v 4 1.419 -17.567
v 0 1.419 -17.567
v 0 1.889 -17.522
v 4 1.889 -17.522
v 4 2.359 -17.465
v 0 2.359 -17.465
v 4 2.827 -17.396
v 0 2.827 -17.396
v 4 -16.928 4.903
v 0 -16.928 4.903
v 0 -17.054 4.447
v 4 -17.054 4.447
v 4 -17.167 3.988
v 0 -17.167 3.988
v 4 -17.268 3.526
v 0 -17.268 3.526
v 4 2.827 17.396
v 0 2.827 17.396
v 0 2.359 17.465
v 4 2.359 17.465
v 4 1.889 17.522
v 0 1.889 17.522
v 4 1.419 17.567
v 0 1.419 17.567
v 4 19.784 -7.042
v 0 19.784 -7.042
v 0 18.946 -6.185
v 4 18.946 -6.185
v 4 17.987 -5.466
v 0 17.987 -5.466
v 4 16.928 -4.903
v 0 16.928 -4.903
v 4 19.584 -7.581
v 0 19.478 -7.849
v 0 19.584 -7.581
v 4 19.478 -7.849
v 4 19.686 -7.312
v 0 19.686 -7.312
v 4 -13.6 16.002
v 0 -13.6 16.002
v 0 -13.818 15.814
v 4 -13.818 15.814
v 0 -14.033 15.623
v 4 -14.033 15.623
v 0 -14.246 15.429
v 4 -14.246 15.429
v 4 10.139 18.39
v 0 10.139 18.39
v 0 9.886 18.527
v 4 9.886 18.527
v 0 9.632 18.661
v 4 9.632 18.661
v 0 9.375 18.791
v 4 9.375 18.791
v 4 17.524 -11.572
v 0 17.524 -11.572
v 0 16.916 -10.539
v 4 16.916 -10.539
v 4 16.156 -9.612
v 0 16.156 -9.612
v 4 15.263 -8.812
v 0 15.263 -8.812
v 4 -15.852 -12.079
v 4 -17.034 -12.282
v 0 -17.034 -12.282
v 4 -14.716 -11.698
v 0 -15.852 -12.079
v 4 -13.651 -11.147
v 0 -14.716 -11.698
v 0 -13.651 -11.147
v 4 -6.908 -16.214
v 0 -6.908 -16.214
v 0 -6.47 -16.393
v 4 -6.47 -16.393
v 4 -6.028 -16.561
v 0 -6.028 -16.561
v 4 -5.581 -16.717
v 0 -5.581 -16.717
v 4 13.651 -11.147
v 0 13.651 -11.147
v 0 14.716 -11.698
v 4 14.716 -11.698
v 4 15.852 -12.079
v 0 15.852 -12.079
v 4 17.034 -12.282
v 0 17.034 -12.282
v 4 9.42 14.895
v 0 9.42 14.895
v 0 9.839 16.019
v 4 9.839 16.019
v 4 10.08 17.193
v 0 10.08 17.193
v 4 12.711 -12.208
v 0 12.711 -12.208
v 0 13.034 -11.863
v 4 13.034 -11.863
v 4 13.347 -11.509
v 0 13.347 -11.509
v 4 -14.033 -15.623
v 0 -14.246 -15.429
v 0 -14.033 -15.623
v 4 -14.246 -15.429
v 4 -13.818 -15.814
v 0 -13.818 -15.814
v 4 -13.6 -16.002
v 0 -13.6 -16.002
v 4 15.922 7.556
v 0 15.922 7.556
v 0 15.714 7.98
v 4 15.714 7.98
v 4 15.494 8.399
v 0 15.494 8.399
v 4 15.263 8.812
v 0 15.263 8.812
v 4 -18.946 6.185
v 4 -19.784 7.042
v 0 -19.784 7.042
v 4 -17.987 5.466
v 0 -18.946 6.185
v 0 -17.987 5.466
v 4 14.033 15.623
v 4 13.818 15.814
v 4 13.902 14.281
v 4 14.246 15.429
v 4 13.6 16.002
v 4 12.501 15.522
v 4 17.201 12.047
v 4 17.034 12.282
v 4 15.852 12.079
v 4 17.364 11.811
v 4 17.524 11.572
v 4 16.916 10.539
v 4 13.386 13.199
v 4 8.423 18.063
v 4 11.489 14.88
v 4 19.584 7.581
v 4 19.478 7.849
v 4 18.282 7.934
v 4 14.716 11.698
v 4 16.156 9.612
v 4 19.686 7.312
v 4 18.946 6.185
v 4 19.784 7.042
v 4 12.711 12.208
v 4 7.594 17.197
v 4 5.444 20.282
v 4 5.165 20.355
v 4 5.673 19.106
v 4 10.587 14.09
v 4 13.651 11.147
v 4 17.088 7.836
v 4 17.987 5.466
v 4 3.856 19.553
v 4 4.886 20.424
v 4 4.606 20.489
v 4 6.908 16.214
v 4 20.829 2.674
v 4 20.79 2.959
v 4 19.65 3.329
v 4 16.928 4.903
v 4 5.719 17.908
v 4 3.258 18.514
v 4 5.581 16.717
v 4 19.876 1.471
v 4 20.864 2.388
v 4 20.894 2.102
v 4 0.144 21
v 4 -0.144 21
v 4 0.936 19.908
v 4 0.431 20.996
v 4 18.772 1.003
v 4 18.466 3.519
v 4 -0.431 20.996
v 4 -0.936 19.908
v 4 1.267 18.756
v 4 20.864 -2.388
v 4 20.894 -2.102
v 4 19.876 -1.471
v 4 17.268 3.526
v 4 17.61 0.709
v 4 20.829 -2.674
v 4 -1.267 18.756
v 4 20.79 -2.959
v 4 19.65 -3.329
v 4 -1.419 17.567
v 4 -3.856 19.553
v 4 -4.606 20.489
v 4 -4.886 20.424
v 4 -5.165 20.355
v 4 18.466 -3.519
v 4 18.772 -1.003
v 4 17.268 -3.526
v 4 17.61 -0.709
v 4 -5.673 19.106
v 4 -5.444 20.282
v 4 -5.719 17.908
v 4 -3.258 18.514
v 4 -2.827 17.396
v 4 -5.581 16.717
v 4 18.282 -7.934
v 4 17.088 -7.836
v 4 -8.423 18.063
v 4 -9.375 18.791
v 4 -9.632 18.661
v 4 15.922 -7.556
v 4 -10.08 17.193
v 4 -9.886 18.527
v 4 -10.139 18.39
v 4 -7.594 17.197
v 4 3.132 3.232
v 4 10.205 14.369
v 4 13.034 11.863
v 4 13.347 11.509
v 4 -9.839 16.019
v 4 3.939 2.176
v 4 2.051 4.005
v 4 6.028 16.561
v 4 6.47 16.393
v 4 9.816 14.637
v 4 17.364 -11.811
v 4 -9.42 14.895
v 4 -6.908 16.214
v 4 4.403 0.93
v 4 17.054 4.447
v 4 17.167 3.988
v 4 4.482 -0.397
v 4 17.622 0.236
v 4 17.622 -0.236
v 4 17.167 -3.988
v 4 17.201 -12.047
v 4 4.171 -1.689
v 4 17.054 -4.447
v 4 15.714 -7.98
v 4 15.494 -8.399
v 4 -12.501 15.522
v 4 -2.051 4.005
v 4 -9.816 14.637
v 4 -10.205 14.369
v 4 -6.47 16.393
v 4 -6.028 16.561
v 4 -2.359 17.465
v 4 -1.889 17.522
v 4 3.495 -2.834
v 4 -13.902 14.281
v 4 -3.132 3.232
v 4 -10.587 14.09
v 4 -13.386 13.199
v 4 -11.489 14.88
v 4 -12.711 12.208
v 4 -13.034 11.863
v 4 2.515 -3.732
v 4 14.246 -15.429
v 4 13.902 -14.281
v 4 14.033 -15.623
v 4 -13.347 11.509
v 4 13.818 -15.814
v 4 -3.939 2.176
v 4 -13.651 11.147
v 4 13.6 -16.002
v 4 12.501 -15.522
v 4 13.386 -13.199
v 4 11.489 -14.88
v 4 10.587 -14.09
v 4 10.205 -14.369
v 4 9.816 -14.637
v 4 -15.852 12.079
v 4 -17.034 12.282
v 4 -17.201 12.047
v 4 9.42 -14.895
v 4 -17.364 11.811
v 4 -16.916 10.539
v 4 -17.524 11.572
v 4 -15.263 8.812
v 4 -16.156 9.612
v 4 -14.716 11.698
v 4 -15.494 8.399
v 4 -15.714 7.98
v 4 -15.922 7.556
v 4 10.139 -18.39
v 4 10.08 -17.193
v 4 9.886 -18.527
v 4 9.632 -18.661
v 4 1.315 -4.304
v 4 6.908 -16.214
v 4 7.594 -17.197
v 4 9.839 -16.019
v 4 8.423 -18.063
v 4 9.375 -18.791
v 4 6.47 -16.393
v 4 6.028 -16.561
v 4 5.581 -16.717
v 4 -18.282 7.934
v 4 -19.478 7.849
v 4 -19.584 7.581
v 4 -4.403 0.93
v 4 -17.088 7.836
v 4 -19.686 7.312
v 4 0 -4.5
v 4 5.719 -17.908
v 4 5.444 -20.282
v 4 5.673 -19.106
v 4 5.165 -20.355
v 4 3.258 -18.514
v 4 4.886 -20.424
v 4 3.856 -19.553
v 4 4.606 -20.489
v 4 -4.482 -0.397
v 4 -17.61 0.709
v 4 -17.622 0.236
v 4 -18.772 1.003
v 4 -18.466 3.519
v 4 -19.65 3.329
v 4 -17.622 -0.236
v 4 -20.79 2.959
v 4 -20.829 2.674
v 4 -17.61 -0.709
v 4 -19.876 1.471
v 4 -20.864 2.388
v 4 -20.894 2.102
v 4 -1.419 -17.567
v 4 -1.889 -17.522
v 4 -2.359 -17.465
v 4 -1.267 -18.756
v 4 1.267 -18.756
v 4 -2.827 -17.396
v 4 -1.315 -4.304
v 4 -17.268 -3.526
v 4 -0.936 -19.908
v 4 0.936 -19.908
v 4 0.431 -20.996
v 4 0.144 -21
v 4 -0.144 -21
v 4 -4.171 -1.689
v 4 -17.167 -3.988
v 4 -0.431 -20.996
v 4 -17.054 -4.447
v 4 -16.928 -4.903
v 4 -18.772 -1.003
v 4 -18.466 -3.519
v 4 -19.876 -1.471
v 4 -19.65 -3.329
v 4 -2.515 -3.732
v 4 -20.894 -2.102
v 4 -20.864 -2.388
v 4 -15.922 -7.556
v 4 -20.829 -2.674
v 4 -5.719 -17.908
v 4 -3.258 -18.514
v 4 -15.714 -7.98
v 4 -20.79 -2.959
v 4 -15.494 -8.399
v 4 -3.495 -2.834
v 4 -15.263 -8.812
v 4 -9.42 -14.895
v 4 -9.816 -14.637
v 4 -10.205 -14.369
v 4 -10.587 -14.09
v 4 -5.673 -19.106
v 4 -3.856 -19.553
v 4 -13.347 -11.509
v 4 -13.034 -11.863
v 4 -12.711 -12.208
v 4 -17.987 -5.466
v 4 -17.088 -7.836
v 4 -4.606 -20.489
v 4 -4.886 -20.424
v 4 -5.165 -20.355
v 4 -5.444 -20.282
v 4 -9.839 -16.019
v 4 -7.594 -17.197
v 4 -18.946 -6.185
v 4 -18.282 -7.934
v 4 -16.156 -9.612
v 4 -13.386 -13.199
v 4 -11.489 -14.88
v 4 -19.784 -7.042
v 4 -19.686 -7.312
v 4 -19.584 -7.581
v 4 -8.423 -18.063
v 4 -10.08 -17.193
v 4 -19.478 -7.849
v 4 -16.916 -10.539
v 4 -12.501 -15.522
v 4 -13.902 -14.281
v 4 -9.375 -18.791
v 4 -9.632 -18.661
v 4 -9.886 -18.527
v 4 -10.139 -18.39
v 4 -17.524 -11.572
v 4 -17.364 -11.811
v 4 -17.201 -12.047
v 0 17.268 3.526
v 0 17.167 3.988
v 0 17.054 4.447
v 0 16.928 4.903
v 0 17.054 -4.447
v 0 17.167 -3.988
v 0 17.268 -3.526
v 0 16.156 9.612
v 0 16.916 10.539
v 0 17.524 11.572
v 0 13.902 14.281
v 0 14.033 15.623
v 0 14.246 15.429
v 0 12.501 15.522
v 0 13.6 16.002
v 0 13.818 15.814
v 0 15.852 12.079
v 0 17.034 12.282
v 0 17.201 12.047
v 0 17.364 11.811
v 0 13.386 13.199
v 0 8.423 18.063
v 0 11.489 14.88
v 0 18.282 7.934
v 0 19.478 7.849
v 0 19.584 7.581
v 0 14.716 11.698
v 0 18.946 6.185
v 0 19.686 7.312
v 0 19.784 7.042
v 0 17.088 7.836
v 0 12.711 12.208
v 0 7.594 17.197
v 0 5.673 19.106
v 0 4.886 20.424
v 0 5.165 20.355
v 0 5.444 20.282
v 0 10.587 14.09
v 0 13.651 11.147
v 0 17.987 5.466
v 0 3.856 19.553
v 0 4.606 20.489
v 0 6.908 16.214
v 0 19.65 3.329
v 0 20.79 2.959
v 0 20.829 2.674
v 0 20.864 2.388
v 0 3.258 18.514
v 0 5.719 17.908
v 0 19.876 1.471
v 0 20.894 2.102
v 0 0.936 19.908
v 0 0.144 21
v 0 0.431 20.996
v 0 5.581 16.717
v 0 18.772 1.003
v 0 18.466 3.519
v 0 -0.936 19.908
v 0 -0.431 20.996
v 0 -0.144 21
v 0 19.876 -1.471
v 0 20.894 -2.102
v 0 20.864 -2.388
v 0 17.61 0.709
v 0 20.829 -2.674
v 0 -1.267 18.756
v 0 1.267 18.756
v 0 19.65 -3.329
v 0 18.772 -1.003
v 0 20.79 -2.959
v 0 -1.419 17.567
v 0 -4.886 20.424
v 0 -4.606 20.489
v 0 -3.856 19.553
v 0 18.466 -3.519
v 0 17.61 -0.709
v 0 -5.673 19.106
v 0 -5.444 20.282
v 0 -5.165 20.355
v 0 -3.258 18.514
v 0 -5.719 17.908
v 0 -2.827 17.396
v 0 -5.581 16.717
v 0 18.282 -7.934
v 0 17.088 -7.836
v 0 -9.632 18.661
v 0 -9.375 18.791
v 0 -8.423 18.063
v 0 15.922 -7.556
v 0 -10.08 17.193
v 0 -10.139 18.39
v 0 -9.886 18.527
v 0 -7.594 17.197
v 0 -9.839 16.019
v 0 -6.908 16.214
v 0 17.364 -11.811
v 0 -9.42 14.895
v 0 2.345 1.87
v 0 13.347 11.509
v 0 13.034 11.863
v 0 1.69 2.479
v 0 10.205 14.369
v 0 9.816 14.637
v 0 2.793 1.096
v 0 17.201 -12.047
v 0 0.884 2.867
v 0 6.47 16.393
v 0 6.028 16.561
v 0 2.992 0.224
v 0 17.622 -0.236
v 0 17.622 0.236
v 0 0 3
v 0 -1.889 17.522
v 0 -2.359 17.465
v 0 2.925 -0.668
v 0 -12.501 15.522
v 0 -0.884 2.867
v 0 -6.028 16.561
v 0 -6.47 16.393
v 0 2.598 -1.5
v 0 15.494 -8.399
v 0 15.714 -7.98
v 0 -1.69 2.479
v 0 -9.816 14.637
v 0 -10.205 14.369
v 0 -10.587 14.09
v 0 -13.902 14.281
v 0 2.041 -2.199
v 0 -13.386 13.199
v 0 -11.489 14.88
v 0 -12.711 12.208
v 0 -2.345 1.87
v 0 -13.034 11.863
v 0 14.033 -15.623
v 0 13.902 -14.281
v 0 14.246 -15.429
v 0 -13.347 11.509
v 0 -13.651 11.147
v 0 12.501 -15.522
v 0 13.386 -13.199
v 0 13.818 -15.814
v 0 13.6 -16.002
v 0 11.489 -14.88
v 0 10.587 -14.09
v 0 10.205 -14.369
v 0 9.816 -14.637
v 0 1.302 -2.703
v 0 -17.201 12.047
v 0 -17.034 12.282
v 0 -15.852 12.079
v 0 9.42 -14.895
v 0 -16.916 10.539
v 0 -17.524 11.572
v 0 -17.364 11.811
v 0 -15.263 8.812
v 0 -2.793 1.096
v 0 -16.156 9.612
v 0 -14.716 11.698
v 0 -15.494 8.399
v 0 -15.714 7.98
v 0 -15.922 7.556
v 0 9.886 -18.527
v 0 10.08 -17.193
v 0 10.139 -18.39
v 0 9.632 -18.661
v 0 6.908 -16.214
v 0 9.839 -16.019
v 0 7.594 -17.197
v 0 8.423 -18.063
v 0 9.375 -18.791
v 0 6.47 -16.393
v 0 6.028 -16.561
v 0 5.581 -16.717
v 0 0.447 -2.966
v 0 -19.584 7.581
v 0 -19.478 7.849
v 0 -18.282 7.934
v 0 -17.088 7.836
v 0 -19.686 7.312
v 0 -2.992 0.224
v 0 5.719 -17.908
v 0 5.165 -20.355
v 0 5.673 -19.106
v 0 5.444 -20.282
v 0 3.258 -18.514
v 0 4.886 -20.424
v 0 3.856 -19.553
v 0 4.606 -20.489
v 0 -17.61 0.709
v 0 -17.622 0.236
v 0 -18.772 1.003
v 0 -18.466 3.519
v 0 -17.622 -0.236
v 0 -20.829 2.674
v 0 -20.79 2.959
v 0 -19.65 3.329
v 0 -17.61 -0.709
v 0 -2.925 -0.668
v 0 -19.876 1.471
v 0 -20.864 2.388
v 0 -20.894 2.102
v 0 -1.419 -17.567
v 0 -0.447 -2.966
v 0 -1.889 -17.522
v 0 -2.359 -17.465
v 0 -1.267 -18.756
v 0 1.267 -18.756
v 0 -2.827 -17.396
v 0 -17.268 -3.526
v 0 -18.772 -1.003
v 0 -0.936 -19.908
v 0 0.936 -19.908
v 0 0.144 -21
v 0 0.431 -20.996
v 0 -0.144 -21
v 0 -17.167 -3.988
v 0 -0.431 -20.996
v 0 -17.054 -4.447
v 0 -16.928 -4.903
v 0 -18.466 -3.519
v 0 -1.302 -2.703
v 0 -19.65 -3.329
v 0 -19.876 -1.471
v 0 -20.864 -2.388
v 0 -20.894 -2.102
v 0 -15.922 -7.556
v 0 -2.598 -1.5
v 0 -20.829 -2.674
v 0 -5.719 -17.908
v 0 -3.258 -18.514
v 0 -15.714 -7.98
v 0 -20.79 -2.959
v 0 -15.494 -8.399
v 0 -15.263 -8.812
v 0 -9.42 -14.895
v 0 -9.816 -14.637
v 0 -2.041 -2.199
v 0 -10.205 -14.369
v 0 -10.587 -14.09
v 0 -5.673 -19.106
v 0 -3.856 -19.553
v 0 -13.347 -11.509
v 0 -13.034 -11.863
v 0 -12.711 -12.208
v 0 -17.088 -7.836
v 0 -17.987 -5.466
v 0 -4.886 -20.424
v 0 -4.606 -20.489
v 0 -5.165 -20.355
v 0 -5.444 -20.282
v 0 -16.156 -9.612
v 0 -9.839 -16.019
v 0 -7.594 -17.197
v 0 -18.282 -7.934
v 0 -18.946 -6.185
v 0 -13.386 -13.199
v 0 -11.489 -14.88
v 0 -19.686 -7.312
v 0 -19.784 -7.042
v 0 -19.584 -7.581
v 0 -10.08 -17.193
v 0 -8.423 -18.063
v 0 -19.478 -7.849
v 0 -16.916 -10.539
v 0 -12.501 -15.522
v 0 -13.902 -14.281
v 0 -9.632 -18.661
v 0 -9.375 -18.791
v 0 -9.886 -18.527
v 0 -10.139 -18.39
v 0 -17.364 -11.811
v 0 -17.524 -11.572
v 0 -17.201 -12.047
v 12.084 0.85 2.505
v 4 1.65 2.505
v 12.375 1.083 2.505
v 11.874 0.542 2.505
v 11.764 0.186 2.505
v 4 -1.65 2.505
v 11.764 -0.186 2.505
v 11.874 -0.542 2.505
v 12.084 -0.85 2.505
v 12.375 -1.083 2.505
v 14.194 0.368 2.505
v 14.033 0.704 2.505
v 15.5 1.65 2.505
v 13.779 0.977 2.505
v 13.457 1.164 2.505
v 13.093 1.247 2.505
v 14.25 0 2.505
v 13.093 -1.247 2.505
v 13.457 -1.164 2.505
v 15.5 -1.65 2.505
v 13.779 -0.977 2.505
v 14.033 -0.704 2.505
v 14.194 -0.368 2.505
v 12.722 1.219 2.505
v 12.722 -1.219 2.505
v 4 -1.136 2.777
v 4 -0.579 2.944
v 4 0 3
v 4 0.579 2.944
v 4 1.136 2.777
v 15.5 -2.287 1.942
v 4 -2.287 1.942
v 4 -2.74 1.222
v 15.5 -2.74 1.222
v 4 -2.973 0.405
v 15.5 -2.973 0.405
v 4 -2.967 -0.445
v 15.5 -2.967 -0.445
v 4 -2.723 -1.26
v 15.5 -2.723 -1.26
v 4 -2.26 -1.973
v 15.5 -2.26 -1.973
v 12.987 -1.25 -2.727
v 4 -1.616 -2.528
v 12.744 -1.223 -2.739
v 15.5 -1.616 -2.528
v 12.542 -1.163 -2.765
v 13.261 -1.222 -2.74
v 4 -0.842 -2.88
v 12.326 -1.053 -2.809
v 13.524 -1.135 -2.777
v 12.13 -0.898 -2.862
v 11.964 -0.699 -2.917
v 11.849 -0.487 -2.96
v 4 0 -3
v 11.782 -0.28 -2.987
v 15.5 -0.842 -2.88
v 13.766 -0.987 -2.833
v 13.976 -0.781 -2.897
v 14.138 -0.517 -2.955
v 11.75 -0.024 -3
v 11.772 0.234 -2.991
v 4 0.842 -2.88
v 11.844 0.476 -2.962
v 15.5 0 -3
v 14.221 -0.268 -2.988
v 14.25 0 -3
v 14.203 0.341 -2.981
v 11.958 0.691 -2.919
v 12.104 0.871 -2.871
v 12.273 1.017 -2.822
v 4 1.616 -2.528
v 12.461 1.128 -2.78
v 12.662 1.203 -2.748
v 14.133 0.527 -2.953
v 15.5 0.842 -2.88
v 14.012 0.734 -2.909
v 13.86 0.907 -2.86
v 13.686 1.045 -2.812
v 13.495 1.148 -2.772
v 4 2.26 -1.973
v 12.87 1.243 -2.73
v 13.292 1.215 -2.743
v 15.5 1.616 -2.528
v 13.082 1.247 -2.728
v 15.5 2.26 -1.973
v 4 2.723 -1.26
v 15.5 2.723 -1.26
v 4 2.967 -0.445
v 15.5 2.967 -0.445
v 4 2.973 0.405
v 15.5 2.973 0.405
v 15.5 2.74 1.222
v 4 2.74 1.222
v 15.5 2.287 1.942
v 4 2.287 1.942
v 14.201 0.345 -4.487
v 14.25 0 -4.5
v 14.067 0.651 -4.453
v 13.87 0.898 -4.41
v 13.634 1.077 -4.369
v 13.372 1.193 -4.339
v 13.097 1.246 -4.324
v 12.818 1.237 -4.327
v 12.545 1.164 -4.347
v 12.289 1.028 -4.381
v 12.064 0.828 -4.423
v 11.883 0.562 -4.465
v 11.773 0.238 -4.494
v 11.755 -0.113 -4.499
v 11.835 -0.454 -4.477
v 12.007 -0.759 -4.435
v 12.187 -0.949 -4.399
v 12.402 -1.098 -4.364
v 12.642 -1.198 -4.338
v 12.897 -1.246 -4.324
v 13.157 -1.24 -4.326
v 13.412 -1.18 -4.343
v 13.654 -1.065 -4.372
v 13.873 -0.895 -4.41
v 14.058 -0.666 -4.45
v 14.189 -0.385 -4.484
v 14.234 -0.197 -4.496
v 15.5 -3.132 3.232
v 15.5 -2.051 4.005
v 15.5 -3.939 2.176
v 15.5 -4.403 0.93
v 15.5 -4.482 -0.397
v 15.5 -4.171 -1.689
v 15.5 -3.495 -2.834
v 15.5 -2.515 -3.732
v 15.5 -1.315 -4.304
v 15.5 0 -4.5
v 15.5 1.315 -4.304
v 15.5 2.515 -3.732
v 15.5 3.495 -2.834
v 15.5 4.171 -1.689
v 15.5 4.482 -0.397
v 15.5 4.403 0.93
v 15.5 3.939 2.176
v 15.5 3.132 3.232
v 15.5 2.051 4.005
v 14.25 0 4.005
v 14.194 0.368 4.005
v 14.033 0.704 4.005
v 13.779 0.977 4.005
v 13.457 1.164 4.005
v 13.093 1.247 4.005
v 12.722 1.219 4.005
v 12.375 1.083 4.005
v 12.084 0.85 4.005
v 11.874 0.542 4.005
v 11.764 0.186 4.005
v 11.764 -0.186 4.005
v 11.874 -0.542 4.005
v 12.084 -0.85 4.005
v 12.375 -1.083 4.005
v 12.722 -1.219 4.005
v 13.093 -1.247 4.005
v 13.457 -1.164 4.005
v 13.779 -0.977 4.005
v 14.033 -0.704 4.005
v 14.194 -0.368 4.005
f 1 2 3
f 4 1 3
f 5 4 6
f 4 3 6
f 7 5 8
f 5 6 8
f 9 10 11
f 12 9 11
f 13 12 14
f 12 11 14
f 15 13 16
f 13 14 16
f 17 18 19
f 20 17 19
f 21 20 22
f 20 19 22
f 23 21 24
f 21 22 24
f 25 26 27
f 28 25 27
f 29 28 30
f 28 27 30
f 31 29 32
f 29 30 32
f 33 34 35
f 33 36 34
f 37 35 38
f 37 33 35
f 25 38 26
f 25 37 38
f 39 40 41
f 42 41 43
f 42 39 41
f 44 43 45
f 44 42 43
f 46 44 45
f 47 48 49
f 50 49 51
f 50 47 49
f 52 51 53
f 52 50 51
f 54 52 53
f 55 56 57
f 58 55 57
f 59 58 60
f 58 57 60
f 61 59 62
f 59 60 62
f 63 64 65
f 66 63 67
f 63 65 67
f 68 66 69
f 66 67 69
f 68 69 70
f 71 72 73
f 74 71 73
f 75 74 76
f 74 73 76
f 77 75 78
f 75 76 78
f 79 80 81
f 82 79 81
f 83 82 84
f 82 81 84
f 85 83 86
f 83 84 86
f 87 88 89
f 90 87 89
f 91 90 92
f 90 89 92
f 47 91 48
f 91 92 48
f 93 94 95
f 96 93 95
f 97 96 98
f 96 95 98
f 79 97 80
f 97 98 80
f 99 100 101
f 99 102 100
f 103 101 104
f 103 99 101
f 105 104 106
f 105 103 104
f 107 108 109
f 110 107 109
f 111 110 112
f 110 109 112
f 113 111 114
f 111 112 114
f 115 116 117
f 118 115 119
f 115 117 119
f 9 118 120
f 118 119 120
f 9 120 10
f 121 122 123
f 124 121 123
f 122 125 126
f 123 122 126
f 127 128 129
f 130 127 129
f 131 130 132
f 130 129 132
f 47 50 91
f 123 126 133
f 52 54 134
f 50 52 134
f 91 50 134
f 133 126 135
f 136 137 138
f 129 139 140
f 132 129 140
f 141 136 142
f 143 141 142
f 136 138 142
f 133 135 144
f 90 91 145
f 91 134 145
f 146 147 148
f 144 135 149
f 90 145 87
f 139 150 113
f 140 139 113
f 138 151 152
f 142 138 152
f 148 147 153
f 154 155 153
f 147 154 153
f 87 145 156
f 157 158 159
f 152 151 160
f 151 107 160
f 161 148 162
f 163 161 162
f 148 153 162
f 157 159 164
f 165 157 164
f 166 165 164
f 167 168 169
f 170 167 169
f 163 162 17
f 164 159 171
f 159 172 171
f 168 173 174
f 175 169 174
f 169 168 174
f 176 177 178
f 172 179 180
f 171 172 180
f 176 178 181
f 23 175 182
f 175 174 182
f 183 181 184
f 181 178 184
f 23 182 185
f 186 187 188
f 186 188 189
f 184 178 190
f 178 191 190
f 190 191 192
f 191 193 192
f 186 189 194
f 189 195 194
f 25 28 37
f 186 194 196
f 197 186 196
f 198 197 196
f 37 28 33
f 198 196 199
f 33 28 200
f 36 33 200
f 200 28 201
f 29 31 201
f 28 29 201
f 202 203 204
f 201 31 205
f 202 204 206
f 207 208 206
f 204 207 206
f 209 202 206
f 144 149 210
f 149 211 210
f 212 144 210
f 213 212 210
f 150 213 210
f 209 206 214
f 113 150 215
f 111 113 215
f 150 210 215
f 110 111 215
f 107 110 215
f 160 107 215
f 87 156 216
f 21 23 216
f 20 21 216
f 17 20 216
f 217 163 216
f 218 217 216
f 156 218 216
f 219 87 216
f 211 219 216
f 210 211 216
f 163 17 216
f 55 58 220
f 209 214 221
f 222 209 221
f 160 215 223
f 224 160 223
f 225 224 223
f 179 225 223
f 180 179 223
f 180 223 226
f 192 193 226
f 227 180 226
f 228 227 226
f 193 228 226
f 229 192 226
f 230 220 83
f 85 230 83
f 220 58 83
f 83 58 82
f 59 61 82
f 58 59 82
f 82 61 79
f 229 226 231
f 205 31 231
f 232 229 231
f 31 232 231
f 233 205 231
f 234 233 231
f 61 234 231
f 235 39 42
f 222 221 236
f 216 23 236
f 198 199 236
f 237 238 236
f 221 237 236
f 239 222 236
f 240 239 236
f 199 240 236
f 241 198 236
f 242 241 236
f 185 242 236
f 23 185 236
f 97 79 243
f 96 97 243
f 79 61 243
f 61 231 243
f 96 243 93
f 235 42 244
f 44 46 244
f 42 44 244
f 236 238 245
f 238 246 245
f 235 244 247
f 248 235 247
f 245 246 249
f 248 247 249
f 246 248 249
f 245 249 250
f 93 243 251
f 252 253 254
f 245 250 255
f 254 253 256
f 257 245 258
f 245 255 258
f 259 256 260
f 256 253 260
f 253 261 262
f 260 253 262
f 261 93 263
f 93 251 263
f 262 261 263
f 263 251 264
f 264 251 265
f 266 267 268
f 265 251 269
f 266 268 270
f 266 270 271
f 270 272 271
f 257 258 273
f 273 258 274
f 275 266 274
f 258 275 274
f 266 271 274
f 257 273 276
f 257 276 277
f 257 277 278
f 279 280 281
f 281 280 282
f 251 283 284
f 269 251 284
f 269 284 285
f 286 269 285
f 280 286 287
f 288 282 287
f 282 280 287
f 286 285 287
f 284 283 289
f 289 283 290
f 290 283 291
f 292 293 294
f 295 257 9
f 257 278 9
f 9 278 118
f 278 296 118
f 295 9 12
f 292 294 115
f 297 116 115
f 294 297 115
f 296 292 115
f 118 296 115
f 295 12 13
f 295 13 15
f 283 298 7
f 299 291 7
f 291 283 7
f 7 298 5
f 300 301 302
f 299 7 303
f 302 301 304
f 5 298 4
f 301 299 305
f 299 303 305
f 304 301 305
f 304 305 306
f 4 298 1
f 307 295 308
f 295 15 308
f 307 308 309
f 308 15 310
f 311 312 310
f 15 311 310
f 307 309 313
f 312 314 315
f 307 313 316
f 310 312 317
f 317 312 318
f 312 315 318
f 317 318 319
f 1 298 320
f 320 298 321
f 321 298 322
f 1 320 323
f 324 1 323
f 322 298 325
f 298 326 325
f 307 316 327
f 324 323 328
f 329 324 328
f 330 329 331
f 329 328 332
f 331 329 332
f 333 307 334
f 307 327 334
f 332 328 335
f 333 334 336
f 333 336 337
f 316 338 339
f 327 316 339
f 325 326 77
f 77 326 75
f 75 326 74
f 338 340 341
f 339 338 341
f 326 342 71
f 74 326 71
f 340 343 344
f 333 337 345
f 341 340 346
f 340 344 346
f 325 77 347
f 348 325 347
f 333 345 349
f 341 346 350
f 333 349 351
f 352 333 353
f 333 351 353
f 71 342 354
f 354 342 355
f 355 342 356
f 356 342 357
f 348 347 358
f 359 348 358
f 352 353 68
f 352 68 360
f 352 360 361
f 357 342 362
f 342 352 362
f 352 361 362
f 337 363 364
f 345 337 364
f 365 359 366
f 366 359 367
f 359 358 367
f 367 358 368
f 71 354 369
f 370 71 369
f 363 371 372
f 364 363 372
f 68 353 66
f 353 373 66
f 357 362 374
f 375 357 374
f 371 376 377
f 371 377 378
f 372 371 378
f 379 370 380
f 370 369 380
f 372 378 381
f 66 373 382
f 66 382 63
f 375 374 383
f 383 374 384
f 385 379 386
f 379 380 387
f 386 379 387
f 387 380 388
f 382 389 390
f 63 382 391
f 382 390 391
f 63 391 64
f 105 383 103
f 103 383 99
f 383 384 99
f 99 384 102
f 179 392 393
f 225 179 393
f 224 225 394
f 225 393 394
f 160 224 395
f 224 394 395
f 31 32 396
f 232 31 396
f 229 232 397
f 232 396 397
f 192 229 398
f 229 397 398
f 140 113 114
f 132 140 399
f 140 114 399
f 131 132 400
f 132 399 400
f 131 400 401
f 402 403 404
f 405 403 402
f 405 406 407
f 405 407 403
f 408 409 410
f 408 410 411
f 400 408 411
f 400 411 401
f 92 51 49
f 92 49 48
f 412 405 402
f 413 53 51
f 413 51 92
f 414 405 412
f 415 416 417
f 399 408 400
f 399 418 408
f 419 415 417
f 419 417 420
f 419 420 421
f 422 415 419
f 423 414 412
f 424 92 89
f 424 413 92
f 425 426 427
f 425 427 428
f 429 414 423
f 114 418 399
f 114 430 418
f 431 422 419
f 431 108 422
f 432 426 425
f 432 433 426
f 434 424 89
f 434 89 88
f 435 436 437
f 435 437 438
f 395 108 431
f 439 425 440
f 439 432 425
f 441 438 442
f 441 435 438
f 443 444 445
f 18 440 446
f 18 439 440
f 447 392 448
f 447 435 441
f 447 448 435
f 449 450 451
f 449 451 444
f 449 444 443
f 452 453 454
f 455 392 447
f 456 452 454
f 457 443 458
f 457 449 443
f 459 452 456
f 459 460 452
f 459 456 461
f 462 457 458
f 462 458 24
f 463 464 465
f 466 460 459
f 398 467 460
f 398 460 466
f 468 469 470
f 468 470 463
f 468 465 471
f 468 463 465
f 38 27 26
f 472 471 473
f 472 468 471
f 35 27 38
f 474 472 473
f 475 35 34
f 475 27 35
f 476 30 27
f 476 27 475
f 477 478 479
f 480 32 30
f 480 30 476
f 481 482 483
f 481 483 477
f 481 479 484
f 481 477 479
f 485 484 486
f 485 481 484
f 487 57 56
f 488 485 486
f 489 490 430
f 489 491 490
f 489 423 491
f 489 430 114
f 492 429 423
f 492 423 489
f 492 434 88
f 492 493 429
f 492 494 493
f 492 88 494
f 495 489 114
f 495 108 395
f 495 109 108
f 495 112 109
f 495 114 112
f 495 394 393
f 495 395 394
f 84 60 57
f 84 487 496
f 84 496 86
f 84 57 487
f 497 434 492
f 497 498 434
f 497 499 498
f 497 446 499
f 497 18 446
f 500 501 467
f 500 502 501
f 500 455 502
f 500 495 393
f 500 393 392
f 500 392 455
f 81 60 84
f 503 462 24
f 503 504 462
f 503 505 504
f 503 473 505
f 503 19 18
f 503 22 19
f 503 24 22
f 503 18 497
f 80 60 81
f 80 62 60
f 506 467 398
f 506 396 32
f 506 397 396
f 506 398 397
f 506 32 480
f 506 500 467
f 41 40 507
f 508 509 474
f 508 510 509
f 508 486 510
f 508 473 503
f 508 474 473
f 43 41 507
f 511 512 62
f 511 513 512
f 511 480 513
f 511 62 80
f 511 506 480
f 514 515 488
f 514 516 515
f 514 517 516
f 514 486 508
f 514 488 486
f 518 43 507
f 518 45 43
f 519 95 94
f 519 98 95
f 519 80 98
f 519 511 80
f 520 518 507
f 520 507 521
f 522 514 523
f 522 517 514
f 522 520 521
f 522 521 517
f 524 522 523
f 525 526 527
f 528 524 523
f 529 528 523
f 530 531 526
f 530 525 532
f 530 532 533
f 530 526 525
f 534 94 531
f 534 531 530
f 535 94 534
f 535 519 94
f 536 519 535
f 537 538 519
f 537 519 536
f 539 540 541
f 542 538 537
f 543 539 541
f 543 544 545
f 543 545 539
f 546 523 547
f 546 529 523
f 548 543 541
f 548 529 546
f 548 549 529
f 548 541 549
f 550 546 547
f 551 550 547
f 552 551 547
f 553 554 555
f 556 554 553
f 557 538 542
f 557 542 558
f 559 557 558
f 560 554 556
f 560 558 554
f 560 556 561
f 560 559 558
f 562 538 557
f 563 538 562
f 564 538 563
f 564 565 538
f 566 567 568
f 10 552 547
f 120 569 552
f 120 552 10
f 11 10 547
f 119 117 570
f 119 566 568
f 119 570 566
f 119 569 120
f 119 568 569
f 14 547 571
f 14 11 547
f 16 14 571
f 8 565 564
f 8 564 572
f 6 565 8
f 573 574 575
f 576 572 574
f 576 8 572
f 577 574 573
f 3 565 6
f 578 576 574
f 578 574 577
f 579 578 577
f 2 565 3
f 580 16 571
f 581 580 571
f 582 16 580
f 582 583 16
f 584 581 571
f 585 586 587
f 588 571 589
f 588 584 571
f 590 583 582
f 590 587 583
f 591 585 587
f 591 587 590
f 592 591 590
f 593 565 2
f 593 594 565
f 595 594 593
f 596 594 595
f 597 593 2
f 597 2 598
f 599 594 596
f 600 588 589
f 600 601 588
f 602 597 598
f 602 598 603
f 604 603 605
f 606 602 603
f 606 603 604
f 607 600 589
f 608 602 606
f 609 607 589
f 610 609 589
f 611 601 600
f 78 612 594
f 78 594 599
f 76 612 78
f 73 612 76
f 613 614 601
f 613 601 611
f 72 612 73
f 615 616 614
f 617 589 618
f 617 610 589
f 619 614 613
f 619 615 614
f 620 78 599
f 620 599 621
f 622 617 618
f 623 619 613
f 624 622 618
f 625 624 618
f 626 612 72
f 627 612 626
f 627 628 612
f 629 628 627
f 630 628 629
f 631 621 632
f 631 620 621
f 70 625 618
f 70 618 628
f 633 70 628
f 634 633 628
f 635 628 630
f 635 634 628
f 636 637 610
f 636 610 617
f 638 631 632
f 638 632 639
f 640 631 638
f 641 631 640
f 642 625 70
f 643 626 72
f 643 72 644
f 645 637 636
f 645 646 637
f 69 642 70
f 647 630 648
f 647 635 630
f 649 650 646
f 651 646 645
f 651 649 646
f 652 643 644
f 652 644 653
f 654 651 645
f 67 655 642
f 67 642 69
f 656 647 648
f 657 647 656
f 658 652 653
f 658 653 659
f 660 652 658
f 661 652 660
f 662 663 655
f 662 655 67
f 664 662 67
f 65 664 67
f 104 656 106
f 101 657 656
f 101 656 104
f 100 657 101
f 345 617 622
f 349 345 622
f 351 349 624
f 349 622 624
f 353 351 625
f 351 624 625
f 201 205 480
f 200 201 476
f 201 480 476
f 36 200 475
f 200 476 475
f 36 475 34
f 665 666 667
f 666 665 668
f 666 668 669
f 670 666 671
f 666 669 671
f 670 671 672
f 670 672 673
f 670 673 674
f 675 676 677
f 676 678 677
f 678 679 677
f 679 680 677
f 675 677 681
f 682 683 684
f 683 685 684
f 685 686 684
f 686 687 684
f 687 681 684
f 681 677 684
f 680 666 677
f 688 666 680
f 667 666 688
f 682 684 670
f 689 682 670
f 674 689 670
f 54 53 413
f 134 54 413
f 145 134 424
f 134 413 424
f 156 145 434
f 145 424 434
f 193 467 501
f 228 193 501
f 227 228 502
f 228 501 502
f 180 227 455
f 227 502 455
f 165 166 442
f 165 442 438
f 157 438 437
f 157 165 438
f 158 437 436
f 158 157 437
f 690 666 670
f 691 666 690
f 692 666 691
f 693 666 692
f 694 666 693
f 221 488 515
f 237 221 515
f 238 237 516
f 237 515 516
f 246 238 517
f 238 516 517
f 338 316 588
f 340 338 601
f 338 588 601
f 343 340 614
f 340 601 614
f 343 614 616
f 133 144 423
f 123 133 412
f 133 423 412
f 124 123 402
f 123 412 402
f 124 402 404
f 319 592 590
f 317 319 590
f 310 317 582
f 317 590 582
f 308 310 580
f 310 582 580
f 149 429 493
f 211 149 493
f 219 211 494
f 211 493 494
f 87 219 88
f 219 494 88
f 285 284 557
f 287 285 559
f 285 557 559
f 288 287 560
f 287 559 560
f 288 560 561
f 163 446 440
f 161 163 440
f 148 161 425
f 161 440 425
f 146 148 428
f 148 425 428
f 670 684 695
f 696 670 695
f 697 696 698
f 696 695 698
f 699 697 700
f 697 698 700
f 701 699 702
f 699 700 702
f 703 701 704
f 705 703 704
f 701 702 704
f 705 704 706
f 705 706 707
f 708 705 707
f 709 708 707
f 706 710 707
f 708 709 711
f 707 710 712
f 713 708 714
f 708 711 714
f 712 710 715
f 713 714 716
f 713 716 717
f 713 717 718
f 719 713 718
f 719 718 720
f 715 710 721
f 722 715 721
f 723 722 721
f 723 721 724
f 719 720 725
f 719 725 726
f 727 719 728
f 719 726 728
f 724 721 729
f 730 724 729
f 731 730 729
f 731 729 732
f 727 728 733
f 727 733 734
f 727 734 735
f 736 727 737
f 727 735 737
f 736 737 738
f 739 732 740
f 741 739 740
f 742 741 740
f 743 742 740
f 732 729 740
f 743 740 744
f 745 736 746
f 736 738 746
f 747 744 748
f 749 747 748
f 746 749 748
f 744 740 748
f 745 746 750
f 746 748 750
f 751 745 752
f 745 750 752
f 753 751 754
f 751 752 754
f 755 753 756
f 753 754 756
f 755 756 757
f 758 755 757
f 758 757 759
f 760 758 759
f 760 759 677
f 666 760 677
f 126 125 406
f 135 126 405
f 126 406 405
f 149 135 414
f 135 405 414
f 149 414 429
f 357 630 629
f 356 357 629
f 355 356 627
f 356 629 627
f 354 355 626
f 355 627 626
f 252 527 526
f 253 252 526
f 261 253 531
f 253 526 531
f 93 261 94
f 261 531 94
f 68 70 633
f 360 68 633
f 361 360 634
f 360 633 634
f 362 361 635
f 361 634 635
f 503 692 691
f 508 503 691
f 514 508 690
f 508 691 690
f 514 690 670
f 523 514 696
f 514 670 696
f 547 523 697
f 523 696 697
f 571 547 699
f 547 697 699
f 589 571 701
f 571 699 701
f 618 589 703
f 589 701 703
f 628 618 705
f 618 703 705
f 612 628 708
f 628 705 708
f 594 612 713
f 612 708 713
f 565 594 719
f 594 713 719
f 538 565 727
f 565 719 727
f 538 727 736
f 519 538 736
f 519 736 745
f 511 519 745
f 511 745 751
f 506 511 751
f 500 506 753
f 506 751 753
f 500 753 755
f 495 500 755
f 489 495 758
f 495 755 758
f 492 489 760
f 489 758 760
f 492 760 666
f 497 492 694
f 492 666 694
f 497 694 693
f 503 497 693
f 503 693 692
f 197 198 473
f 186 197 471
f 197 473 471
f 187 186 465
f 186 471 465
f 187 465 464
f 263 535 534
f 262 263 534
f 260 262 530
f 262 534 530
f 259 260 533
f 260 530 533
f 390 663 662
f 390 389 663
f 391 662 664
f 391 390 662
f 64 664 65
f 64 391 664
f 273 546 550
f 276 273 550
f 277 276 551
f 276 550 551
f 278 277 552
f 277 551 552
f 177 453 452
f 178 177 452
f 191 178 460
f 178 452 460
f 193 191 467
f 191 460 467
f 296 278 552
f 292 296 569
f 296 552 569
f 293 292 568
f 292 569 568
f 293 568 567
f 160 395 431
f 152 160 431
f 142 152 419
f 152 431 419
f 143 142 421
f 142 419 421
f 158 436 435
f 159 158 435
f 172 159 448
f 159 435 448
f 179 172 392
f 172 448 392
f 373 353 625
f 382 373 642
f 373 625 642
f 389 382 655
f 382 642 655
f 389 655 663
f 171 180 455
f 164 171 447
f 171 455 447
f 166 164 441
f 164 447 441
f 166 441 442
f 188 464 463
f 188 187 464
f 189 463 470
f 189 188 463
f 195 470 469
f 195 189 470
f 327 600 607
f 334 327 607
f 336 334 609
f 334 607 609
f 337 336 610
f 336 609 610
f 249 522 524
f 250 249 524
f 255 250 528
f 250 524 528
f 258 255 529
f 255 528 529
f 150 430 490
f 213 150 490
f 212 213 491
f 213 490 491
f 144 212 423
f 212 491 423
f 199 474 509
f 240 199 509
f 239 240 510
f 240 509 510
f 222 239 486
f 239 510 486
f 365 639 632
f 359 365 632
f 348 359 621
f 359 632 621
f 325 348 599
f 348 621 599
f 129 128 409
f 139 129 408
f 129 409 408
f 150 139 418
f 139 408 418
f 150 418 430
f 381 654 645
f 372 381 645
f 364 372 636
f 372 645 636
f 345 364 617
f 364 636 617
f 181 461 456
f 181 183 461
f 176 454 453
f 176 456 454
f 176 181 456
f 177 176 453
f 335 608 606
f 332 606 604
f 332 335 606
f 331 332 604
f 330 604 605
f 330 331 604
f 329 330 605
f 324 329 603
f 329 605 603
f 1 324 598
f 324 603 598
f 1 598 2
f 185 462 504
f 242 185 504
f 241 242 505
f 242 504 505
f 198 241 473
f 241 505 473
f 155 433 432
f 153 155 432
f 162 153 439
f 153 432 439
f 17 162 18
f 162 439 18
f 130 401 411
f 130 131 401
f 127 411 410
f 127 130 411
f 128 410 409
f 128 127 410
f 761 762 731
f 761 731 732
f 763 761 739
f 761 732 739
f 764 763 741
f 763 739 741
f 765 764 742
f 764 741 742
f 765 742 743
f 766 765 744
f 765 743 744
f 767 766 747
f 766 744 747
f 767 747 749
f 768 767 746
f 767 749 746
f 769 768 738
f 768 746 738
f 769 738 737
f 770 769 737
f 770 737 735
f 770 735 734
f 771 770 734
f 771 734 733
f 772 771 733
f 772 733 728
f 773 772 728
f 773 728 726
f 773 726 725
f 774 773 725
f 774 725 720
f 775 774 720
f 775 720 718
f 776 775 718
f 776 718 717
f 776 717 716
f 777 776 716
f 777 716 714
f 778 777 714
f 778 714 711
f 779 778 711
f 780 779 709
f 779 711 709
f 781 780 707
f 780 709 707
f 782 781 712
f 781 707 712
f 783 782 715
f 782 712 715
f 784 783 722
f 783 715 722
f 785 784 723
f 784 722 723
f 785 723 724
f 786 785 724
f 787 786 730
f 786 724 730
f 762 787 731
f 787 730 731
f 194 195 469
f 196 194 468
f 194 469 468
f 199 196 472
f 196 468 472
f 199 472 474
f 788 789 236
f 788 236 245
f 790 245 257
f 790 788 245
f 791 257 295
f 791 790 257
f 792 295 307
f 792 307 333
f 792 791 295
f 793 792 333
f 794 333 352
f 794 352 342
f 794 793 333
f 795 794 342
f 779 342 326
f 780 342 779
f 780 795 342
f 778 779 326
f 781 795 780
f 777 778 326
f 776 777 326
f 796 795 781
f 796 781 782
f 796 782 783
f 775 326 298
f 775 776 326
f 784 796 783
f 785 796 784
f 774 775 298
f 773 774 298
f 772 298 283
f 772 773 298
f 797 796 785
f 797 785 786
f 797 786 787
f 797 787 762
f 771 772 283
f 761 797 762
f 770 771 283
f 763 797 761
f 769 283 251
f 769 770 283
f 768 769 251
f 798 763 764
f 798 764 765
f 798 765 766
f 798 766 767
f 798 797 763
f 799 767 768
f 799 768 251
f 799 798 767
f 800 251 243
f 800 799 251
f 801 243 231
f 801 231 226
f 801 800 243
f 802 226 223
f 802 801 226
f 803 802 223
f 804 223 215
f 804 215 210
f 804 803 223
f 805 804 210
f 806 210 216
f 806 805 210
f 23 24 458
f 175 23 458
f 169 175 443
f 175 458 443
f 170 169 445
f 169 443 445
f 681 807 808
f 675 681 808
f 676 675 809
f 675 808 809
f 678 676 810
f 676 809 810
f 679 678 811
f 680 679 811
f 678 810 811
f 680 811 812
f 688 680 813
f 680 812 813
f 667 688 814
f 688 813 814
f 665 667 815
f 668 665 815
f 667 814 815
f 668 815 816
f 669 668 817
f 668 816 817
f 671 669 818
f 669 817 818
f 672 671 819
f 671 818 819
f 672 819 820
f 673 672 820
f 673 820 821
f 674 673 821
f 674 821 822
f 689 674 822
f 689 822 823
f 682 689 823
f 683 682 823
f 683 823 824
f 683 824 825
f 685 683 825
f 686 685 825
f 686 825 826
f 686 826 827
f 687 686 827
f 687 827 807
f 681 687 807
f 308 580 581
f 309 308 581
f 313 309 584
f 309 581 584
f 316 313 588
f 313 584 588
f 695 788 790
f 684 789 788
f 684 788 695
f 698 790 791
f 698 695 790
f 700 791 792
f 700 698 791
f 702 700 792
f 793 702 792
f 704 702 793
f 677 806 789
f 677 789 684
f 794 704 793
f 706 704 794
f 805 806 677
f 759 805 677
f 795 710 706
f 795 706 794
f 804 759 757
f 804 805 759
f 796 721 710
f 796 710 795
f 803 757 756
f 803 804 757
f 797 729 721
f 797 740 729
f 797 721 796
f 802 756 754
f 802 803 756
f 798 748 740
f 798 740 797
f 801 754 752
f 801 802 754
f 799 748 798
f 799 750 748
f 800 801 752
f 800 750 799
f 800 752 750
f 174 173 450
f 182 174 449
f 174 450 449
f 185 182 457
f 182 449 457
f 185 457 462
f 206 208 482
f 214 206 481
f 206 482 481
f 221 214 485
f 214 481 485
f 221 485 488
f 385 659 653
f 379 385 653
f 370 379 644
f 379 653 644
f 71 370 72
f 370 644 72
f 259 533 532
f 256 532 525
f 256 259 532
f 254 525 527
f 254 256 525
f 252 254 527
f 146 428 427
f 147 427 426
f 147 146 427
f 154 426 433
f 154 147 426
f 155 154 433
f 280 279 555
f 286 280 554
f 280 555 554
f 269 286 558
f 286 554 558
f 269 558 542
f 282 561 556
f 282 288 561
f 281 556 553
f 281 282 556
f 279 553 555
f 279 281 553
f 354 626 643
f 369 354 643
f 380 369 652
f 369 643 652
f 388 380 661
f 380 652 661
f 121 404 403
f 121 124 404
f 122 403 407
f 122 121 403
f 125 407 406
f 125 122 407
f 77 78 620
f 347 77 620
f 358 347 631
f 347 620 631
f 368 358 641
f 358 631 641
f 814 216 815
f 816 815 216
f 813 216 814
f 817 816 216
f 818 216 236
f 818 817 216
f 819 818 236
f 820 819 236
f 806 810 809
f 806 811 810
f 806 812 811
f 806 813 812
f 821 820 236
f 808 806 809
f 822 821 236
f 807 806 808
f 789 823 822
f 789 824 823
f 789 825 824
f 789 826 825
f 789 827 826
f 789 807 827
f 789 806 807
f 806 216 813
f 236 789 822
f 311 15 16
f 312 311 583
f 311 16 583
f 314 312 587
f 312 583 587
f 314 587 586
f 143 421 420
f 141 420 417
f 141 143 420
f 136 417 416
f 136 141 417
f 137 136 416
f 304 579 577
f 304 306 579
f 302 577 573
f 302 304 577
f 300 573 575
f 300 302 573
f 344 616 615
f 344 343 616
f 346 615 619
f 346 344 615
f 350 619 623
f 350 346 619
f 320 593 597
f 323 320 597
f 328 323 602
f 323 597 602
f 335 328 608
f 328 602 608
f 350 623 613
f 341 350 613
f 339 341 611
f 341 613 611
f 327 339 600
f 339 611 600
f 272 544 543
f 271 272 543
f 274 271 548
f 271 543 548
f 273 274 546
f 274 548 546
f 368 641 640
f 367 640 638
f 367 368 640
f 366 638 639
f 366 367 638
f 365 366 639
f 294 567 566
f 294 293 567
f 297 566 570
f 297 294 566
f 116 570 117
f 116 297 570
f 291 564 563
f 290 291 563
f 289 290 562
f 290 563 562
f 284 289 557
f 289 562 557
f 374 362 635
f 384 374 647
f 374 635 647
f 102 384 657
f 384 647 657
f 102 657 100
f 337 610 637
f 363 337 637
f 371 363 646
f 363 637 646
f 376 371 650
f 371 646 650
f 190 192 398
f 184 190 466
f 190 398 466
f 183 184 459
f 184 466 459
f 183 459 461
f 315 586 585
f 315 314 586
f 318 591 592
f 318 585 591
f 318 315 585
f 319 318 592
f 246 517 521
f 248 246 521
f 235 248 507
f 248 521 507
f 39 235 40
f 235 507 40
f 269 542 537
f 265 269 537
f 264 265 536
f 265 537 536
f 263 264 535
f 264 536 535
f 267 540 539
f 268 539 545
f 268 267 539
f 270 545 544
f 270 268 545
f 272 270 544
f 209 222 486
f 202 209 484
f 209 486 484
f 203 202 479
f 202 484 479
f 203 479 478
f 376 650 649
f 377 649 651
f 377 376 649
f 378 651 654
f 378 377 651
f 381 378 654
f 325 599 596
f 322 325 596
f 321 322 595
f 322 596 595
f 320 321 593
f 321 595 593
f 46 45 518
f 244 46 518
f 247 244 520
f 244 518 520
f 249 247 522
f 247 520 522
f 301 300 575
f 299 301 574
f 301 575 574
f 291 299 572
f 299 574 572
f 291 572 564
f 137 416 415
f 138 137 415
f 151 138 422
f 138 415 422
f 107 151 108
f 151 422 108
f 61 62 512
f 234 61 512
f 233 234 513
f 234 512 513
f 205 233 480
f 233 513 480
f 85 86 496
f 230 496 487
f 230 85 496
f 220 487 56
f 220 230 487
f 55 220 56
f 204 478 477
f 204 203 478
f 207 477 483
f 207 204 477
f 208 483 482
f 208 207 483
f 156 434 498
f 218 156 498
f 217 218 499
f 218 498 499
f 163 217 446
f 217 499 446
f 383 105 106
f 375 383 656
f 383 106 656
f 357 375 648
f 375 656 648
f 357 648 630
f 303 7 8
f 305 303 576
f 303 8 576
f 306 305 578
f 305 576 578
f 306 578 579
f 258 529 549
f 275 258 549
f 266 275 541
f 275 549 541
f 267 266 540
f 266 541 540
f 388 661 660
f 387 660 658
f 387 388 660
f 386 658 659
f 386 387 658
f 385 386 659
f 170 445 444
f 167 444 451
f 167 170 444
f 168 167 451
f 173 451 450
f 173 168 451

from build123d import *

# Parameters (mm, degrees)
BASPROSKE_W         = 4
BASPROSKE_H         = 21
TOOTHCUT_DEPTH      = 30.966648128
TEETHCUTS_COUNT     = 26
TEETHCUTS_ANGLE     = 346.153846154
BORSKE_R            = 3
BORE_DEPTH          = 50.0000508
EXTRUDE_START       = 11.5
EXTRUDE_1_DEPTH     = 11.5
SKETCH_2_R          = 1.25
CUT_EXTRUDE_1_DEPTH = 37.084686733


with BuildPart() as part:
    # BasProSke → Base-Revolve (revolve)
    with BuildSketch(Plane(origin=(0, 0, 0), x_dir=(1, 0, 0), z_dir=(0, 1, 0)), mode=Mode.PRIVATE) as base_revolve_sk:
        with Locations((2, 10.5)):
            Rectangle(BASPROSKE_W, BASPROSKE_H)
    revolve(base_revolve_sk.sketch.rotate(Axis((-10, 0, 0), (1, 0, 0)), 180), axis=Axis((-10, 0, 0), (1, 0, 0)))

    # TooCutSke → ToothCut (cut, through all)
    with BuildSketch(Plane(origin=(0, 0, 0), x_dir=(0, 0, -1), z_dir=(1, 0, 0))):
        with BuildLine():
            ThreePointArc((0.70920213, 17.609724823), (0, 17.624), (-0.70920213, 17.609724823))
            ThreePointArc((-0.70920213, 17.609724823), (-1.221230171, 19.346413175), (-2.119872395, 20.918259636))
            ThreePointArc((-2.119872395, 20.918259636), (0, 21.0254), (2.119872395, 20.918259636))
            ThreePointArc((2.119872395, 20.918259636), (1.221230171, 19.346413175), (0.70920213, 17.609724823))
        make_face()
    toothcut = extrude(amount=TOOTHCUT_DEPTH, mode=Mode.SUBTRACT)

    # TeethCuts: ToothCut ×26 about axis
    teethcuts_axis = Axis((-10, 0, 0), (1, 0, 0))
    for i in range(1, TEETHCUTS_COUNT):
        add(toothcut.rotate(teethcuts_axis, i * TEETHCUTS_ANGLE / (TEETHCUTS_COUNT - 1)), mode=Mode.SUBTRACT)

    # BorSke → Bore (cut, symmetric)
    with BuildSketch(Plane(origin=(0, 0, 0), x_dir=(0, 0, -1), z_dir=(1, 0, 0))):
        with Locations(Location((0, 0, 0), (0, 0, 180))):
            Circle(BORSKE_R)
    extrude(amount=BORE_DEPTH, both=True, mode=Mode.SUBTRACT)

    # 草图1 → 凸台-拉伸1 (add)
    with BuildSketch(Plane(origin=(4, 0, 0), x_dir=(0, 0, -1), z_dir=(1, 0, 0)).offset(EXTRUDE_START)):
        with BuildLine():
            Line((-4.005493963, 2.050857896), (-4.005493963, -2.050857896))
            ThreePointArc((-4.005493963, -2.050857896), (4.5, 0), (-4.005493963, 2.050857896))
        make_face()
        with BuildLine():
            Line((-2.505493963, 1.65), (-2.505493963, -1.65))
            ThreePointArc((-2.505493963, -1.65), (3, 0), (-2.505493963, 1.65))
        make_face(mode=Mode.SUBTRACT)
    extrude(amount=-EXTRUDE_1_DEPTH)

    # 草图2 → 切除-拉伸1 (cut, through all)
    with BuildSketch(Plane.XY.offset(4.005493963)):
        with Locations((13, 0)):
            Circle(SKETCH_2_R)
    extrude(amount=-CUT_EXTRUDE_1_DEPTH, mode=Mode.SUBTRACT)


solid = part.part
